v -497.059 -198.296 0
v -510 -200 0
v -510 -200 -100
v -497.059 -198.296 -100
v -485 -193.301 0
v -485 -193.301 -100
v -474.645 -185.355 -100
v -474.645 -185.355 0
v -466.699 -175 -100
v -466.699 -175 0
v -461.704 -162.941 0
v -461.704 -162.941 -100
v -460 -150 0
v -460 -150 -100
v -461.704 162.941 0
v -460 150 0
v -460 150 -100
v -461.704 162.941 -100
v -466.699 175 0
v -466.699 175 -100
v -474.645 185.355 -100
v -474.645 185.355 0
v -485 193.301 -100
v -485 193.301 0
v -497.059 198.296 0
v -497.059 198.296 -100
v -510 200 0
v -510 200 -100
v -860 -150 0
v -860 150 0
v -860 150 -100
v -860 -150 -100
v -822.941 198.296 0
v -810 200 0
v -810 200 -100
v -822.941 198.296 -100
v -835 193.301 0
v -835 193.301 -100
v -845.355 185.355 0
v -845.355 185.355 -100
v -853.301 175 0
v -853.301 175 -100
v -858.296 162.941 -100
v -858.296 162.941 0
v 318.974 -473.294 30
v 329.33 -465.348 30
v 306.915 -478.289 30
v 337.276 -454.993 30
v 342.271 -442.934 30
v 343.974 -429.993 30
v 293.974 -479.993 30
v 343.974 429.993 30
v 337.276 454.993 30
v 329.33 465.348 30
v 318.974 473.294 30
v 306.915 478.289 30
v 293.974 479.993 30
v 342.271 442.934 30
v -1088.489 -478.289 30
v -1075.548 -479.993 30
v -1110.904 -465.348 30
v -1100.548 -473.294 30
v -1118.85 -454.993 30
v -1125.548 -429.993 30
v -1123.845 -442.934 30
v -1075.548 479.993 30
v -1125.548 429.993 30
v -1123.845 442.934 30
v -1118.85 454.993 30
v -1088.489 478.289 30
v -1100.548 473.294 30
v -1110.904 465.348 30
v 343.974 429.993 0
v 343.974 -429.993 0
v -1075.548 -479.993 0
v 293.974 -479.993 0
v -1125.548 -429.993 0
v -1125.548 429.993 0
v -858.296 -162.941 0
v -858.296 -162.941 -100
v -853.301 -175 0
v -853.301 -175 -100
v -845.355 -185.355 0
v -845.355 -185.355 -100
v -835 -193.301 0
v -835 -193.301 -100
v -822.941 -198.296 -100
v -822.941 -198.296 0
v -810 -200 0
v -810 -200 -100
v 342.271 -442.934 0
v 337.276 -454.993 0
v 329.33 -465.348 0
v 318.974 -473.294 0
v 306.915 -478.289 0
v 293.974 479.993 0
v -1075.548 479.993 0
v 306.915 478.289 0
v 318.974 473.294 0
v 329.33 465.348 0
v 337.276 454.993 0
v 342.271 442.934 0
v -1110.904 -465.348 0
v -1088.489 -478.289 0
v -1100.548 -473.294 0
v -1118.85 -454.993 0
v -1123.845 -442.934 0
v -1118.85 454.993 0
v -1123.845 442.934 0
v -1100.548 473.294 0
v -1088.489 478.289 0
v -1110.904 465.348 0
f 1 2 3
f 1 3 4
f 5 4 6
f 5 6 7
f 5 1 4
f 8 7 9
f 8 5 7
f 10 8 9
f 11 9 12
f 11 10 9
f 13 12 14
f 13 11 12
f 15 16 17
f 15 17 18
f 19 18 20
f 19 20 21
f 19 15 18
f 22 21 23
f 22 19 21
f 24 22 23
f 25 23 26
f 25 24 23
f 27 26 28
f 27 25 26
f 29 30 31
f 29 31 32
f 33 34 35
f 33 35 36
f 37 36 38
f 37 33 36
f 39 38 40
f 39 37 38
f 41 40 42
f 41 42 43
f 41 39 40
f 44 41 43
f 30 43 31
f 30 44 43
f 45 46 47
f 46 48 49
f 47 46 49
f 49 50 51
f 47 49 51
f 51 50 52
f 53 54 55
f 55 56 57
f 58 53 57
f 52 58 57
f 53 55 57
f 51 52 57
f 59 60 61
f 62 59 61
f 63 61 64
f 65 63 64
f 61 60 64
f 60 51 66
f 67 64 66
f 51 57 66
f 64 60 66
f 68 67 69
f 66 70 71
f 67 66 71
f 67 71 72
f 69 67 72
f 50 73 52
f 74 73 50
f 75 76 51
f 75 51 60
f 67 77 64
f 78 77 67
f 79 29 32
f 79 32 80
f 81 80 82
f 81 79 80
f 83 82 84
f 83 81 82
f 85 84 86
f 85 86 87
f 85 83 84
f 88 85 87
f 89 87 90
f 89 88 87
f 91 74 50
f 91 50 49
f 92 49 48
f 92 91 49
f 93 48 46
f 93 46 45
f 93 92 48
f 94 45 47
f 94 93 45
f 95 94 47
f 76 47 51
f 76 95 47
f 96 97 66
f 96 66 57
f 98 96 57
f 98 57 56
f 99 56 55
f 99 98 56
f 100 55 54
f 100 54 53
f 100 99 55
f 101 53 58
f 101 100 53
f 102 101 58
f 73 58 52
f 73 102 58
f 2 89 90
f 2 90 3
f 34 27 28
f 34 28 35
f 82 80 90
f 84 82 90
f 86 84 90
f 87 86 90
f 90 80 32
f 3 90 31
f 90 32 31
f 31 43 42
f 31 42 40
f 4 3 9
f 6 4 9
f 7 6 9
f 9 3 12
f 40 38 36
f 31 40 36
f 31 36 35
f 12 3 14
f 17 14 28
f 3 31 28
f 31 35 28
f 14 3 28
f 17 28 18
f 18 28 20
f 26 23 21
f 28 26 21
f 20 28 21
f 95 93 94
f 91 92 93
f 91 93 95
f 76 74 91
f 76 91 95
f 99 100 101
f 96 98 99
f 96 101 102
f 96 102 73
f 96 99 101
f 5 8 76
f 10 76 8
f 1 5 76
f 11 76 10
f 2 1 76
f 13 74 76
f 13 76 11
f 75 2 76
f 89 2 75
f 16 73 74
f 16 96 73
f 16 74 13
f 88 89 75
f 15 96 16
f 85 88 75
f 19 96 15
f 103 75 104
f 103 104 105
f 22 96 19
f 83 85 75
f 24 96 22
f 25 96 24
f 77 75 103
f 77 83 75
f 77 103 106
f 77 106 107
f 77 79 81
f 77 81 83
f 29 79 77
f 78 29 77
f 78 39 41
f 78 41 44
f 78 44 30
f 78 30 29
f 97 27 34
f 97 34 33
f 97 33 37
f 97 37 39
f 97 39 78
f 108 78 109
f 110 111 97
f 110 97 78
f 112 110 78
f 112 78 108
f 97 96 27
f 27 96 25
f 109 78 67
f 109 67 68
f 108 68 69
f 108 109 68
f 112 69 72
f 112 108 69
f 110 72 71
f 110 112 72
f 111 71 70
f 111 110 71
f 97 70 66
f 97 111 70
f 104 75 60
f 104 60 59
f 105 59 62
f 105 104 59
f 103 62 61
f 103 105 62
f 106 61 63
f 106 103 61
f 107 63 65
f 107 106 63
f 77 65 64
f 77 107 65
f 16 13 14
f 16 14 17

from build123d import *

# Parameters (mm, degrees)
EXTRUDE_1_DEPTH = 30
EXTRUDE_2_DEPTH = 100


with BuildPart() as part:
    # 草图2 → 凸台-拉伸1 (new body)
    with BuildSketch(Plane.XY):
        with BuildLine():
            Line((-1075.548373655, 479.992677665), (293.974322669, 479.992677665))
            ThreePointArc((293.974322669, 479.992677665), (329.329661728, 465.348016724), (343.974322669, 429.992677665))
            Line((343.974322669, 429.992677665), (343.974322669, -429.992677665))
            ThreePointArc((343.974322669, -429.992677665), (329.329661728, -465.348016724), (293.974322669, -479.992677665))
            Line((293.974322669, -479.992677665), (-1075.548373655, -479.992677665))
            ThreePointArc((-1075.548373655, -479.992677665), (-1110.903712715, -465.348016724), (-1125.548373655, -429.992677665))
            Line((-1125.548373655, -429.992677665), (-1125.548373655, 429.992677665))
            ThreePointArc((-1125.548373655, 429.992677665), (-1110.903712715, 465.348016724), (-1075.548373655, 479.992677665))
        make_face()
    extrude(amount=EXTRUDE_1_DEPTH)

    # 草图4 → 凸台-拉伸2 (add)
    with BuildSketch(Plane(origin=(0, 0, 0), x_dir=(-1, 0, 0), z_dir=(0, 0, -1))):
        with BuildLine():
            Line((510, 200), (810, 200))
            ThreePointArc((810, 200), (845.355339059, 185.355339059), (860, 150))
            Line((860, 150), (860, -150))
            ThreePointArc((860, -150), (845.355339059, -185.355339059), (810, -200))
            Line((810, -200), (510, -200))
            ThreePointArc((510, -200), (474.644660941, -185.355339059), (460, -150))
            Line((460, -150), (460, 150))
            ThreePointArc((460, 150), (474.644660941, 185.355339059), (510, 200))
        make_face()
    extrude(amount=EXTRUDE_2_DEPTH)


solid = part.part
